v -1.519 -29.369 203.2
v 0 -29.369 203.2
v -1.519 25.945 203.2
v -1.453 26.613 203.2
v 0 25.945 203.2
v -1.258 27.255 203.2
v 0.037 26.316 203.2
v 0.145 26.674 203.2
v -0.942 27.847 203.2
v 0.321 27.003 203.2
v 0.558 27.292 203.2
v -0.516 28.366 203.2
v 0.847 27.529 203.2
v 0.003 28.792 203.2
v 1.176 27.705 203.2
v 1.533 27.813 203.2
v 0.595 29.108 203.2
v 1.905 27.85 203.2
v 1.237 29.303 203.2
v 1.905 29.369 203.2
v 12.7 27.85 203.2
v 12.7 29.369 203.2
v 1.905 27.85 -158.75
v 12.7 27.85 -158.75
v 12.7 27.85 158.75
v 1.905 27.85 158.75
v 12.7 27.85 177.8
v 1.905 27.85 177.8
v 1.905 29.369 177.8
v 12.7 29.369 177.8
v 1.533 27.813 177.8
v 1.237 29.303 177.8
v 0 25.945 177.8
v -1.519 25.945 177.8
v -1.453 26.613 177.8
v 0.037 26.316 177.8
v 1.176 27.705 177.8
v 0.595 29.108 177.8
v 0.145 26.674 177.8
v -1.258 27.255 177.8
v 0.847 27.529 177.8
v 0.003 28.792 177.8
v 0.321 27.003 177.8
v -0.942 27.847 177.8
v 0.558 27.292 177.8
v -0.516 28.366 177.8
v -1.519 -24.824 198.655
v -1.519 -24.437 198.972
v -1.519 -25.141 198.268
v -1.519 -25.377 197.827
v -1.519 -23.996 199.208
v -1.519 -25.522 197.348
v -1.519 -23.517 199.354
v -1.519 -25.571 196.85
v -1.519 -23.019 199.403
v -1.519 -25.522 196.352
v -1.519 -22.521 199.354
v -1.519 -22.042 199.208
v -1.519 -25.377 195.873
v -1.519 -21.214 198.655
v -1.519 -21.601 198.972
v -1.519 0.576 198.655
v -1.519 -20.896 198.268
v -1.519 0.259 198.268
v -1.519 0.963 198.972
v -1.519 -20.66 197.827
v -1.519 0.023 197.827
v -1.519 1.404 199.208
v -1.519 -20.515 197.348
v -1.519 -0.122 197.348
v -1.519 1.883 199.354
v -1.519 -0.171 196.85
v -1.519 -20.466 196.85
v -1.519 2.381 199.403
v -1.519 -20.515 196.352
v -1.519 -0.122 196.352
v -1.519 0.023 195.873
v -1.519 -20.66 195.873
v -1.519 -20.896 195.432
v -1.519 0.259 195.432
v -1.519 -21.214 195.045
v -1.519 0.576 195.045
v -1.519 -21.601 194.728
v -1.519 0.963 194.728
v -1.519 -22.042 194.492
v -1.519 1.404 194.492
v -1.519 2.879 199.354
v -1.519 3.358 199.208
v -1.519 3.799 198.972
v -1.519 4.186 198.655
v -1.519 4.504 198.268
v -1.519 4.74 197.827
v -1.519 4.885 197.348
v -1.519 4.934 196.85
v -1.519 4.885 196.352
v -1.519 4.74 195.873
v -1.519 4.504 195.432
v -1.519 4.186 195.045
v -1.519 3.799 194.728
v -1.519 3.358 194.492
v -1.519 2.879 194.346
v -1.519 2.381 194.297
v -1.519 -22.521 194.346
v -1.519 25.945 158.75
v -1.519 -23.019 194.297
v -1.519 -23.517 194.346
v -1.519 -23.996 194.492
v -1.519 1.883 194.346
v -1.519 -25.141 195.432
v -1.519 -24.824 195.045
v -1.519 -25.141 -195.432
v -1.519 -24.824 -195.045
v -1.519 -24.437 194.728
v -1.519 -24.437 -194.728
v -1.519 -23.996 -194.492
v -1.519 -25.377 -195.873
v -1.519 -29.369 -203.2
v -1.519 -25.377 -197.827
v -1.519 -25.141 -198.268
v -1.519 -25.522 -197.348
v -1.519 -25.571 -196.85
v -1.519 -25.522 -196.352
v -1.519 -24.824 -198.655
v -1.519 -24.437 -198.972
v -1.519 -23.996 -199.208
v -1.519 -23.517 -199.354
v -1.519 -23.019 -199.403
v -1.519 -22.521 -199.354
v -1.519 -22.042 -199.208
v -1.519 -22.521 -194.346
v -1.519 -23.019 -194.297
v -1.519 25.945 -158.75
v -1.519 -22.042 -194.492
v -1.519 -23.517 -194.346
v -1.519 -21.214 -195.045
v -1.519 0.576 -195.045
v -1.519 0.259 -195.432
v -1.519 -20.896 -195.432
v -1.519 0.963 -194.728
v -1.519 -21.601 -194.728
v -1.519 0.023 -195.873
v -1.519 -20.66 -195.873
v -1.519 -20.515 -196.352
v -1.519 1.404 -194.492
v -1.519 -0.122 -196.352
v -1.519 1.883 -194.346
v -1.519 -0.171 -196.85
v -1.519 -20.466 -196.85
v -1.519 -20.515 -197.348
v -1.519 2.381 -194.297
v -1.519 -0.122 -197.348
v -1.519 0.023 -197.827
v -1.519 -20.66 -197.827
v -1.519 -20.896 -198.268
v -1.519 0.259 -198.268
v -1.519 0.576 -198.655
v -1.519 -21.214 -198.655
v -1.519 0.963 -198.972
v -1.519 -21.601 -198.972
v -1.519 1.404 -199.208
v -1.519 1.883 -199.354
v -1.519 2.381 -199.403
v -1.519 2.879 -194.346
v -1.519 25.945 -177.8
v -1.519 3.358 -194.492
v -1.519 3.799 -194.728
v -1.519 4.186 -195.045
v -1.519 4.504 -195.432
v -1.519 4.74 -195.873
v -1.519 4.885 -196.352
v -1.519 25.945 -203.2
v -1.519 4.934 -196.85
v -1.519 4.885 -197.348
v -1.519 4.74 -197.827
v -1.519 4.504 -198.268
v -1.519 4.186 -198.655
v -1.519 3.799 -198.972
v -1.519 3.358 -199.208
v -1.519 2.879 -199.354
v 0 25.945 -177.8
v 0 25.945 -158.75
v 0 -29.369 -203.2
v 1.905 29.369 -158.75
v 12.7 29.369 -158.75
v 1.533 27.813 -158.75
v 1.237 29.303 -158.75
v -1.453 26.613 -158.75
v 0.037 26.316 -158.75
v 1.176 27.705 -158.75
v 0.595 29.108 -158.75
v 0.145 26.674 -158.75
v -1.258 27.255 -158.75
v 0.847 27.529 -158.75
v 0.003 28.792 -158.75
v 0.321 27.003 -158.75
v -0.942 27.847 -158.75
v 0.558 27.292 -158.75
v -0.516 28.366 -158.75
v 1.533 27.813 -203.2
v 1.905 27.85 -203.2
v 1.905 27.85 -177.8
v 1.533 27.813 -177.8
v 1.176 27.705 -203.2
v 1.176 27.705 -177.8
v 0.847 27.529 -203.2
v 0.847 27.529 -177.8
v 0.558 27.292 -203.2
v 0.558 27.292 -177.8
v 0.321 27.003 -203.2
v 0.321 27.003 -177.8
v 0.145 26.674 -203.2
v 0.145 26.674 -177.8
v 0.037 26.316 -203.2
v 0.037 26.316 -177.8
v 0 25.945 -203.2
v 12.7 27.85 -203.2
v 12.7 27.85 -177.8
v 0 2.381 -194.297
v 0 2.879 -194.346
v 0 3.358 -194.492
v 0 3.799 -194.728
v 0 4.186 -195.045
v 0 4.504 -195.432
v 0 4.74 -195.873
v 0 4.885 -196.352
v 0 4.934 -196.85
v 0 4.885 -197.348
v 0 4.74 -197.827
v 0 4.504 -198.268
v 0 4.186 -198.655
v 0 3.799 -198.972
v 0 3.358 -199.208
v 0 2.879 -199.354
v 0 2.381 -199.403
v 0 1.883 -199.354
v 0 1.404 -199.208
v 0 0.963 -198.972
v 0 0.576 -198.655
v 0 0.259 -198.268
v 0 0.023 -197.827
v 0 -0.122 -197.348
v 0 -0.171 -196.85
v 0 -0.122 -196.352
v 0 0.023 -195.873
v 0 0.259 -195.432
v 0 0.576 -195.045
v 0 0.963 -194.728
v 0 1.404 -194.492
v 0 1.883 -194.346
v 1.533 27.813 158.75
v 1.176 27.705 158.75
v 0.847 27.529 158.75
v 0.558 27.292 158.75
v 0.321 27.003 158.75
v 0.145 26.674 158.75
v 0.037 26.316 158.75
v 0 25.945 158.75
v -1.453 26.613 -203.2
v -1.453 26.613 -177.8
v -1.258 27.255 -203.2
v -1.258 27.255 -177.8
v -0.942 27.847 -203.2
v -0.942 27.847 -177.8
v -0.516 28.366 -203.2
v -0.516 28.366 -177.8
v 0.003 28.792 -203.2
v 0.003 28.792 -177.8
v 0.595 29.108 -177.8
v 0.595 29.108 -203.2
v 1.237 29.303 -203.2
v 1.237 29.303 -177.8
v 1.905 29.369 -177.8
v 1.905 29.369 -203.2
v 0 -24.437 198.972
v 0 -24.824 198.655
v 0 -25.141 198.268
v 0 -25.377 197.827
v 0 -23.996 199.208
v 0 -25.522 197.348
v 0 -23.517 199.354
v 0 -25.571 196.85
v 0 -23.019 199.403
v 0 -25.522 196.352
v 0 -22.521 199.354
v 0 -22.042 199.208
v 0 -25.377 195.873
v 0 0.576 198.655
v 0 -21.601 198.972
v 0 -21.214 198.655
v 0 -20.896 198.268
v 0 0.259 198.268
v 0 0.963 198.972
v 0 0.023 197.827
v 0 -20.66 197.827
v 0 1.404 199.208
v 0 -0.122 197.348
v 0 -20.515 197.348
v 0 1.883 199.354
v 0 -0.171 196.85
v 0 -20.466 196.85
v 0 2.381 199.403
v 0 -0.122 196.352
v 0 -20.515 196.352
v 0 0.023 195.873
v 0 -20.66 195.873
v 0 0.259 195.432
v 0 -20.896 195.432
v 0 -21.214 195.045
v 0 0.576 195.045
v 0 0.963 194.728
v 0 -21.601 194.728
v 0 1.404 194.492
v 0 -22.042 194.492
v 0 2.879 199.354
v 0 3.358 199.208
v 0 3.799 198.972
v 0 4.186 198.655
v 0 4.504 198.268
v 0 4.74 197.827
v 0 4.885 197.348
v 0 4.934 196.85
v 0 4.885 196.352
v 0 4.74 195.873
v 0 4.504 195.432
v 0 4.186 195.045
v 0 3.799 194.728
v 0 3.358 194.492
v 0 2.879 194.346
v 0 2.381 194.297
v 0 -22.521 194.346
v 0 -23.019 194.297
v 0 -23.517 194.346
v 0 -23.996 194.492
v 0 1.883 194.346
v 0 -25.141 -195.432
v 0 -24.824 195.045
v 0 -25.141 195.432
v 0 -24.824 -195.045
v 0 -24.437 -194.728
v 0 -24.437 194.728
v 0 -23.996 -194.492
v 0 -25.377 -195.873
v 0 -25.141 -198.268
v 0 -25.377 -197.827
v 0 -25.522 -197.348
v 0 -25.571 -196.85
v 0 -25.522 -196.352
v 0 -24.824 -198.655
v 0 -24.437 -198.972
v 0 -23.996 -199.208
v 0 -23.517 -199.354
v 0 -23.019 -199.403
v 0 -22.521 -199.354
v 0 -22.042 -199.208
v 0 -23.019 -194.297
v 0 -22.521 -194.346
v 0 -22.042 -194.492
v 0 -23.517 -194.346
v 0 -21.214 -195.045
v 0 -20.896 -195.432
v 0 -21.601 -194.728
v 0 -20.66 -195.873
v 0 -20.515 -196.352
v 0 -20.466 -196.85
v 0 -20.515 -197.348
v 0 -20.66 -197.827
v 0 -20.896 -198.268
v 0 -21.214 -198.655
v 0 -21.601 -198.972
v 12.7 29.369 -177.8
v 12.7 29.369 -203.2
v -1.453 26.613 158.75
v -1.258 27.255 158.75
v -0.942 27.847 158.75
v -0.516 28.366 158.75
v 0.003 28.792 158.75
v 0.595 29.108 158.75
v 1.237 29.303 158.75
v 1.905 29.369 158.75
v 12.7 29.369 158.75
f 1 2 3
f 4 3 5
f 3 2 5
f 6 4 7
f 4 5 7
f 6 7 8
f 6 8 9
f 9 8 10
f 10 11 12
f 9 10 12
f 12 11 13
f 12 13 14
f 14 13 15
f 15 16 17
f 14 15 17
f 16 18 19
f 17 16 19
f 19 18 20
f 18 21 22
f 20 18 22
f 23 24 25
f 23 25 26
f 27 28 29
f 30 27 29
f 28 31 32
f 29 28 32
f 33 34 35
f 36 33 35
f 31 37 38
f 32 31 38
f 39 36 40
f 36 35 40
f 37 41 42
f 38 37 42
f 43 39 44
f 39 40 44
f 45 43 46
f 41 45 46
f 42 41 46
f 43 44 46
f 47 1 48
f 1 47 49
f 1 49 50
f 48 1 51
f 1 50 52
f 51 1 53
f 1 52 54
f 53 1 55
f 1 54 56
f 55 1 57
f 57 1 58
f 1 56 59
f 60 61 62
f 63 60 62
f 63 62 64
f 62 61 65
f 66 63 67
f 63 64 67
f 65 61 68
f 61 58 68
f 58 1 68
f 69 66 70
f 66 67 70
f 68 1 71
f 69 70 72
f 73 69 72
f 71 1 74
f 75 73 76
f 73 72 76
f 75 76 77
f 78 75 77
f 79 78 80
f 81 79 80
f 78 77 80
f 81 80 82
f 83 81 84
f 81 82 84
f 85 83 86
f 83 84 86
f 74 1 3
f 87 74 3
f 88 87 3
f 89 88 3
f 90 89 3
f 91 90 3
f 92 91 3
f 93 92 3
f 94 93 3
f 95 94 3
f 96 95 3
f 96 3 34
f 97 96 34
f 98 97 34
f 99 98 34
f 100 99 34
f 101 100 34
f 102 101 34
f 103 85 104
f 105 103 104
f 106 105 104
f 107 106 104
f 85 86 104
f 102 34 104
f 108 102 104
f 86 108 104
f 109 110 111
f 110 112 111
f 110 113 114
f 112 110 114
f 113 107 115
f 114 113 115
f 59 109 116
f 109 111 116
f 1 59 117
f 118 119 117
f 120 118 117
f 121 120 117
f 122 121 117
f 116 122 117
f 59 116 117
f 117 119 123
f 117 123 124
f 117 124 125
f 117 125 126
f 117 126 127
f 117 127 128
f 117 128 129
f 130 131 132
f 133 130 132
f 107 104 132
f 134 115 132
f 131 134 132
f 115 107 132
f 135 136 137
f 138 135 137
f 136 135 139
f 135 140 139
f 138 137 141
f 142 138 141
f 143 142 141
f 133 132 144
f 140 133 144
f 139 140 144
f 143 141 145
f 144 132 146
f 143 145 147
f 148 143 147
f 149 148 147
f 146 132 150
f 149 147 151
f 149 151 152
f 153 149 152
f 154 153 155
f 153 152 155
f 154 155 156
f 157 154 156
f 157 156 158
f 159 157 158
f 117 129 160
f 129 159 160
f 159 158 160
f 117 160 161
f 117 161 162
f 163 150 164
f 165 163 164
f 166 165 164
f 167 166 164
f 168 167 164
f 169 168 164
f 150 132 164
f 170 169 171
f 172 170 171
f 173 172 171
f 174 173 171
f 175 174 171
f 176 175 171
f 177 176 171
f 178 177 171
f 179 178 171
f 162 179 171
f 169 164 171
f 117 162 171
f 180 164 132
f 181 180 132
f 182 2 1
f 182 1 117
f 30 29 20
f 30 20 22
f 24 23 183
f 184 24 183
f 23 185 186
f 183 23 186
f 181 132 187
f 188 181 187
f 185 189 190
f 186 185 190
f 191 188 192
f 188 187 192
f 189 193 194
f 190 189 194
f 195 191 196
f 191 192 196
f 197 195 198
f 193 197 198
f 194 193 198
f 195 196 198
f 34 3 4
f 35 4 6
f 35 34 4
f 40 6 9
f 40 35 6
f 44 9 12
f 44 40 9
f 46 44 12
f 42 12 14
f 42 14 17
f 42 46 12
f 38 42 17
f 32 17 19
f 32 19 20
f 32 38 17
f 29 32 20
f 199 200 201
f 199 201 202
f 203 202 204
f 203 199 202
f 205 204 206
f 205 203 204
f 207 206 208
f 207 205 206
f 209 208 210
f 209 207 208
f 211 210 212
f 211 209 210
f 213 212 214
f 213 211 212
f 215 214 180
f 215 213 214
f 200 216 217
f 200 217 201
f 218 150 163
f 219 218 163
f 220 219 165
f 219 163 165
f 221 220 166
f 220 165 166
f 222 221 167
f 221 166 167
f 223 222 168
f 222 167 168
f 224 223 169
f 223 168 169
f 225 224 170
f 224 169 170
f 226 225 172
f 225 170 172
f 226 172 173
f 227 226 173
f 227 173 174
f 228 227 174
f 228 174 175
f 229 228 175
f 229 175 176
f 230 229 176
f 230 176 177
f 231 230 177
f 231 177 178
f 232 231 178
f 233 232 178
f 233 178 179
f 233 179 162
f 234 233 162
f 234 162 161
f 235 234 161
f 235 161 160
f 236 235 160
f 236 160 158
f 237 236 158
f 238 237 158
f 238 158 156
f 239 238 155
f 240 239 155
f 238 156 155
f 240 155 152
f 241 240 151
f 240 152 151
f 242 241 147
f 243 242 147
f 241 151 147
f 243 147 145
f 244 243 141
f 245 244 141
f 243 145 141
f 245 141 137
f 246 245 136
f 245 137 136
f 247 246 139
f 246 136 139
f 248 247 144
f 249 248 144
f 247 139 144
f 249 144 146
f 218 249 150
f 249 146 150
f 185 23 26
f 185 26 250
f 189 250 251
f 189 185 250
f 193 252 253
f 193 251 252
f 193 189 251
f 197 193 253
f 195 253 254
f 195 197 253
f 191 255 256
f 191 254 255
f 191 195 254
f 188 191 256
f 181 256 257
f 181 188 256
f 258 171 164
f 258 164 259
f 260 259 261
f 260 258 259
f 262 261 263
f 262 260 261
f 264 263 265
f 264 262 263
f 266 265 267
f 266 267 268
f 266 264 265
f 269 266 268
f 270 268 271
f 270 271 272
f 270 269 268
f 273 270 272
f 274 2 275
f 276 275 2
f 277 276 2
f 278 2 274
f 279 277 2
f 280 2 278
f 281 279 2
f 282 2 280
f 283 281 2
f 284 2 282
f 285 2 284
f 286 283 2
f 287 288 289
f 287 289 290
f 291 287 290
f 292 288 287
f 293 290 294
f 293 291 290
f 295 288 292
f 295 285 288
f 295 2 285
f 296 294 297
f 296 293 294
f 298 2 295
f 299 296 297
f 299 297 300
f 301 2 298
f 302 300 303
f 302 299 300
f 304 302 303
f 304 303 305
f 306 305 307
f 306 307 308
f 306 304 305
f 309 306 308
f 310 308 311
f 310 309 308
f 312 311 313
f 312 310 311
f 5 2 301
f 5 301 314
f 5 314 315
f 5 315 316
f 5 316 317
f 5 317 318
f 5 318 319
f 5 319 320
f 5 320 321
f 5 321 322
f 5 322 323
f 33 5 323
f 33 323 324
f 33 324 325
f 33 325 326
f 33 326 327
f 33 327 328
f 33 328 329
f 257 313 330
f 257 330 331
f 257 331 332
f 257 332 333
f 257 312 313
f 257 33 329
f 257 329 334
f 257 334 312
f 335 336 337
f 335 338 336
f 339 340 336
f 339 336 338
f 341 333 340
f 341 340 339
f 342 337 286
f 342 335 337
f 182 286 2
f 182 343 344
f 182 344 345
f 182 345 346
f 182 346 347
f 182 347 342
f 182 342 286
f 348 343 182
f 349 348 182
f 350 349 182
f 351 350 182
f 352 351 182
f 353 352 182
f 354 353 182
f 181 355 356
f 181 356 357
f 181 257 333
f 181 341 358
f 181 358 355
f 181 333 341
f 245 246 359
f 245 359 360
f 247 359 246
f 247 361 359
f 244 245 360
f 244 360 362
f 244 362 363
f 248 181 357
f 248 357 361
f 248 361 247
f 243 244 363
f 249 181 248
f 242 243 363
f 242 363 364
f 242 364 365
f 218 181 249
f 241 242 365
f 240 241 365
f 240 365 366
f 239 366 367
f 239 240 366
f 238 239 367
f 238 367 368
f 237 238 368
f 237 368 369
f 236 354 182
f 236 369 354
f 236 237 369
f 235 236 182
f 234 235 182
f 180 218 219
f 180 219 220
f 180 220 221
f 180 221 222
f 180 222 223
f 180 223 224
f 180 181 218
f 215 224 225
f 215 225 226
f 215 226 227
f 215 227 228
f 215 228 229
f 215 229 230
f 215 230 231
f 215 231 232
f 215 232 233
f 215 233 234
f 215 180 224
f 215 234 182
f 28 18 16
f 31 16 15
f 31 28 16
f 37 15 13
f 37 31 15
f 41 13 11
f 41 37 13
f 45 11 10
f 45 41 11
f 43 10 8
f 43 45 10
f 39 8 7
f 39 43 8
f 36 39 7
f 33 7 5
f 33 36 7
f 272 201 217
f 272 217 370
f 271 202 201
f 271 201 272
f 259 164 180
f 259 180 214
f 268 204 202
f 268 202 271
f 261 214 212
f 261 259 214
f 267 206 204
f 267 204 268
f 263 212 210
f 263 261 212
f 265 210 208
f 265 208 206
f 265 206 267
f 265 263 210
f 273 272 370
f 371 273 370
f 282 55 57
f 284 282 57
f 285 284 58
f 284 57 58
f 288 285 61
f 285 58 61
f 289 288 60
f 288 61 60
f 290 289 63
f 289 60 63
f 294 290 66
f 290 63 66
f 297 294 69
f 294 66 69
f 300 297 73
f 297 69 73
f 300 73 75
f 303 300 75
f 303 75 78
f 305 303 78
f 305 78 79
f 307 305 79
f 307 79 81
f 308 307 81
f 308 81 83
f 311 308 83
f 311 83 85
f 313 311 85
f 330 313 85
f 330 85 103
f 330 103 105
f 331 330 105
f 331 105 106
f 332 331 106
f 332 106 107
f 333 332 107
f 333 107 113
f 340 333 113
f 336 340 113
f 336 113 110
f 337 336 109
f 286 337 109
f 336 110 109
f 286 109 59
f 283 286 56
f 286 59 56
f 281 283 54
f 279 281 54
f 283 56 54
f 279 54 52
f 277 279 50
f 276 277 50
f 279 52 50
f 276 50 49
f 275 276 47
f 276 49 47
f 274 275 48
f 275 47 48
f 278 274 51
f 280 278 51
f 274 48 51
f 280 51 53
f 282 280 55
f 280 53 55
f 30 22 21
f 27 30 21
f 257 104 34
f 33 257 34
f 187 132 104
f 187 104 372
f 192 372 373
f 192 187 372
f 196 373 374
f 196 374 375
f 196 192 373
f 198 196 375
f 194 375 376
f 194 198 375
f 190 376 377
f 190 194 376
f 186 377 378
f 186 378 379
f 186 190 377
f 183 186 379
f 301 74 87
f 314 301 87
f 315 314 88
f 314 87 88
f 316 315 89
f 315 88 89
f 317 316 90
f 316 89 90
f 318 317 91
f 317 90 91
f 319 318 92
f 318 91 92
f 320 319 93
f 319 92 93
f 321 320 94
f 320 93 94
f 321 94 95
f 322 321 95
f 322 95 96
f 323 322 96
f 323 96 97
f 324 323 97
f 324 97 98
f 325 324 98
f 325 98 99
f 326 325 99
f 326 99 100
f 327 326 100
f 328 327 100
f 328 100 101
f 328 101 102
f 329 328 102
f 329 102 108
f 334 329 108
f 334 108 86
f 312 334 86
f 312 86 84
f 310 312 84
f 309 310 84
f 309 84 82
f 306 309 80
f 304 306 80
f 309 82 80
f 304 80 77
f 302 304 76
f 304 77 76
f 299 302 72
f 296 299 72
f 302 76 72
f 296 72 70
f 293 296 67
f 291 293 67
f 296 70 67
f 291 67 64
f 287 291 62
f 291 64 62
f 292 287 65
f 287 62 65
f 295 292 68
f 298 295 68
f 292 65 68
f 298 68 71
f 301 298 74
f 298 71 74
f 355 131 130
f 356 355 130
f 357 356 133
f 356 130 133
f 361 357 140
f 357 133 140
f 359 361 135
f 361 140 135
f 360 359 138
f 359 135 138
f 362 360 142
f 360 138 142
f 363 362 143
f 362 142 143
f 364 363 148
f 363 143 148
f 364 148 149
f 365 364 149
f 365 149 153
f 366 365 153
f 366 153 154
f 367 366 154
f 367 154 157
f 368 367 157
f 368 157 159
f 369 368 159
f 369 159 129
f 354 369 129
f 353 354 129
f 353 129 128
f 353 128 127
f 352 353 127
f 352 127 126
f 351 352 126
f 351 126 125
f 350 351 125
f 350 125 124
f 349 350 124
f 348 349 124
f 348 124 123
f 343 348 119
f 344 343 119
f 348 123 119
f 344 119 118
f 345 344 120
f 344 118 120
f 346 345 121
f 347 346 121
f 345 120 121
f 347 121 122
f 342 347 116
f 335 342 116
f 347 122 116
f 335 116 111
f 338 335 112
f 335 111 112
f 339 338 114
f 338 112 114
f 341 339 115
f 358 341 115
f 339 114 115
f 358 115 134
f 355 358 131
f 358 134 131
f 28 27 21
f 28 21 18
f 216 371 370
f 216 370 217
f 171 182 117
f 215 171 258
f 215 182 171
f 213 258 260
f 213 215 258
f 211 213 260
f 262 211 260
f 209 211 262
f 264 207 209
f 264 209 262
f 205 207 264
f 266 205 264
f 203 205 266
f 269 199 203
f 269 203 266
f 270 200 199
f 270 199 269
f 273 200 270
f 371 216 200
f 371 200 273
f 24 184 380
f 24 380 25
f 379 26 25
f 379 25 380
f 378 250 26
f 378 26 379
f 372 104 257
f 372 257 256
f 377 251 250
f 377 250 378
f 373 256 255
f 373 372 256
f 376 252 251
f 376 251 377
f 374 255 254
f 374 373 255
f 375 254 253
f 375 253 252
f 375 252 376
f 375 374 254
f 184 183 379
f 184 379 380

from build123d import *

# Parameters (mm, degrees)
SKETCH1_W                    = 406.4
SKETCH1_H                    = 58.7375
BASE_FLANGE1_DEPTH           = 1.51892
EDGE_FLANGE1_STRIP_W         = 9.88568
EDGE_FLANGE1_STRIP_H         = 1.51892
EDGE_FLANGE1_STRIP_CUT_DEPTH = 406.4
EDGE_FLANGE1_DEPTH           = 406.4
SKETCH10_W                   = 19.05
SKETCH10_H                   = 3.42392
CUT_EXTRUDE2_DEPTH           = 206.803161206
F_10_CLEARANCE_HOLE1_D       = 5.1054


# Sheet-metal steps are written as plain solids
with BuildPart() as part:
    # Sketch1 → Base-Flange1 (new body)
    with BuildSketch(Plane(origin=(0, 0, 0), x_dir=(0, 0, -1), z_dir=(1, 0, 0))):
        Rectangle(SKETCH1_W, SKETCH1_H)
    extrude(amount=-BASE_FLANGE1_DEPTH)

    # Edge-Flange1 strip (across the edge) → Edge-Flange1 strip cut (cut)
    with BuildSketch(Plane(origin=(0, 29.36875, -203.2), x_dir=(0, -1, 0), z_dir=(0, 0, 1))):
        with Locations((-1.51892, -0.75946)):
            Rectangle(EDGE_FLANGE1_STRIP_W, EDGE_FLANGE1_STRIP_H)
    extrude(amount=EDGE_FLANGE1_STRIP_CUT_DEPTH, mode=Mode.SUBTRACT)

    # Edge-Flange1 section (across the edge) → Edge-Flange1 (add)
    with BuildSketch(Plane(origin=(0, 29.36875, -203.2), x_dir=(0, -1, 0), z_dir=(0, 0, 1))):
        with BuildLine():
            Line((0, 1.905), (0, 12.7))
            Line((0, 12.7), (1.51892, 12.7))
            Line((1.51892, 12.7), (1.51892, 1.905))
            ThreePointArc((1.51892, 1.905), (2.076881582, 0.557961582), (3.42392, 0))
            Line((3.42392, 0), (3.42392, -1.51892))
            ThreePointArc((3.42392, -1.51892), (1.00284295, -0.51607705), (0, 1.905))
        make_face()
    extrude(amount=EDGE_FLANGE1_DEPTH)

    # Sketch10 → Cut-Extrude2 (cut, through all)
    with BuildSketch(Plane.ZY.offset(1.51892)):
        with Locations((-168.275, 27.65679)):
            Rectangle(SKETCH10_W, SKETCH10_H)
        with Locations((168.275, 27.65679)):
            Rectangle(SKETCH10_W, SKETCH10_H)
    extrude(amount=-CUT_EXTRUDE2_DEPTH, mode=Mode.SUBTRACT)

    # #10 Clearance Hole1 (through all)
    with Locations(Plane(origin=(0, 0, 0), x_dir=(0, 0, -1), z_dir=(1, 0, 0))):
        with Locations((-196.85, 2.38125), (196.85, -23.01875), (-196.85, -23.01875), (196.85, 2.38125)):
            Hole(F_10_CLEARANCE_HOLE1_D / 2)


solid = part.part
